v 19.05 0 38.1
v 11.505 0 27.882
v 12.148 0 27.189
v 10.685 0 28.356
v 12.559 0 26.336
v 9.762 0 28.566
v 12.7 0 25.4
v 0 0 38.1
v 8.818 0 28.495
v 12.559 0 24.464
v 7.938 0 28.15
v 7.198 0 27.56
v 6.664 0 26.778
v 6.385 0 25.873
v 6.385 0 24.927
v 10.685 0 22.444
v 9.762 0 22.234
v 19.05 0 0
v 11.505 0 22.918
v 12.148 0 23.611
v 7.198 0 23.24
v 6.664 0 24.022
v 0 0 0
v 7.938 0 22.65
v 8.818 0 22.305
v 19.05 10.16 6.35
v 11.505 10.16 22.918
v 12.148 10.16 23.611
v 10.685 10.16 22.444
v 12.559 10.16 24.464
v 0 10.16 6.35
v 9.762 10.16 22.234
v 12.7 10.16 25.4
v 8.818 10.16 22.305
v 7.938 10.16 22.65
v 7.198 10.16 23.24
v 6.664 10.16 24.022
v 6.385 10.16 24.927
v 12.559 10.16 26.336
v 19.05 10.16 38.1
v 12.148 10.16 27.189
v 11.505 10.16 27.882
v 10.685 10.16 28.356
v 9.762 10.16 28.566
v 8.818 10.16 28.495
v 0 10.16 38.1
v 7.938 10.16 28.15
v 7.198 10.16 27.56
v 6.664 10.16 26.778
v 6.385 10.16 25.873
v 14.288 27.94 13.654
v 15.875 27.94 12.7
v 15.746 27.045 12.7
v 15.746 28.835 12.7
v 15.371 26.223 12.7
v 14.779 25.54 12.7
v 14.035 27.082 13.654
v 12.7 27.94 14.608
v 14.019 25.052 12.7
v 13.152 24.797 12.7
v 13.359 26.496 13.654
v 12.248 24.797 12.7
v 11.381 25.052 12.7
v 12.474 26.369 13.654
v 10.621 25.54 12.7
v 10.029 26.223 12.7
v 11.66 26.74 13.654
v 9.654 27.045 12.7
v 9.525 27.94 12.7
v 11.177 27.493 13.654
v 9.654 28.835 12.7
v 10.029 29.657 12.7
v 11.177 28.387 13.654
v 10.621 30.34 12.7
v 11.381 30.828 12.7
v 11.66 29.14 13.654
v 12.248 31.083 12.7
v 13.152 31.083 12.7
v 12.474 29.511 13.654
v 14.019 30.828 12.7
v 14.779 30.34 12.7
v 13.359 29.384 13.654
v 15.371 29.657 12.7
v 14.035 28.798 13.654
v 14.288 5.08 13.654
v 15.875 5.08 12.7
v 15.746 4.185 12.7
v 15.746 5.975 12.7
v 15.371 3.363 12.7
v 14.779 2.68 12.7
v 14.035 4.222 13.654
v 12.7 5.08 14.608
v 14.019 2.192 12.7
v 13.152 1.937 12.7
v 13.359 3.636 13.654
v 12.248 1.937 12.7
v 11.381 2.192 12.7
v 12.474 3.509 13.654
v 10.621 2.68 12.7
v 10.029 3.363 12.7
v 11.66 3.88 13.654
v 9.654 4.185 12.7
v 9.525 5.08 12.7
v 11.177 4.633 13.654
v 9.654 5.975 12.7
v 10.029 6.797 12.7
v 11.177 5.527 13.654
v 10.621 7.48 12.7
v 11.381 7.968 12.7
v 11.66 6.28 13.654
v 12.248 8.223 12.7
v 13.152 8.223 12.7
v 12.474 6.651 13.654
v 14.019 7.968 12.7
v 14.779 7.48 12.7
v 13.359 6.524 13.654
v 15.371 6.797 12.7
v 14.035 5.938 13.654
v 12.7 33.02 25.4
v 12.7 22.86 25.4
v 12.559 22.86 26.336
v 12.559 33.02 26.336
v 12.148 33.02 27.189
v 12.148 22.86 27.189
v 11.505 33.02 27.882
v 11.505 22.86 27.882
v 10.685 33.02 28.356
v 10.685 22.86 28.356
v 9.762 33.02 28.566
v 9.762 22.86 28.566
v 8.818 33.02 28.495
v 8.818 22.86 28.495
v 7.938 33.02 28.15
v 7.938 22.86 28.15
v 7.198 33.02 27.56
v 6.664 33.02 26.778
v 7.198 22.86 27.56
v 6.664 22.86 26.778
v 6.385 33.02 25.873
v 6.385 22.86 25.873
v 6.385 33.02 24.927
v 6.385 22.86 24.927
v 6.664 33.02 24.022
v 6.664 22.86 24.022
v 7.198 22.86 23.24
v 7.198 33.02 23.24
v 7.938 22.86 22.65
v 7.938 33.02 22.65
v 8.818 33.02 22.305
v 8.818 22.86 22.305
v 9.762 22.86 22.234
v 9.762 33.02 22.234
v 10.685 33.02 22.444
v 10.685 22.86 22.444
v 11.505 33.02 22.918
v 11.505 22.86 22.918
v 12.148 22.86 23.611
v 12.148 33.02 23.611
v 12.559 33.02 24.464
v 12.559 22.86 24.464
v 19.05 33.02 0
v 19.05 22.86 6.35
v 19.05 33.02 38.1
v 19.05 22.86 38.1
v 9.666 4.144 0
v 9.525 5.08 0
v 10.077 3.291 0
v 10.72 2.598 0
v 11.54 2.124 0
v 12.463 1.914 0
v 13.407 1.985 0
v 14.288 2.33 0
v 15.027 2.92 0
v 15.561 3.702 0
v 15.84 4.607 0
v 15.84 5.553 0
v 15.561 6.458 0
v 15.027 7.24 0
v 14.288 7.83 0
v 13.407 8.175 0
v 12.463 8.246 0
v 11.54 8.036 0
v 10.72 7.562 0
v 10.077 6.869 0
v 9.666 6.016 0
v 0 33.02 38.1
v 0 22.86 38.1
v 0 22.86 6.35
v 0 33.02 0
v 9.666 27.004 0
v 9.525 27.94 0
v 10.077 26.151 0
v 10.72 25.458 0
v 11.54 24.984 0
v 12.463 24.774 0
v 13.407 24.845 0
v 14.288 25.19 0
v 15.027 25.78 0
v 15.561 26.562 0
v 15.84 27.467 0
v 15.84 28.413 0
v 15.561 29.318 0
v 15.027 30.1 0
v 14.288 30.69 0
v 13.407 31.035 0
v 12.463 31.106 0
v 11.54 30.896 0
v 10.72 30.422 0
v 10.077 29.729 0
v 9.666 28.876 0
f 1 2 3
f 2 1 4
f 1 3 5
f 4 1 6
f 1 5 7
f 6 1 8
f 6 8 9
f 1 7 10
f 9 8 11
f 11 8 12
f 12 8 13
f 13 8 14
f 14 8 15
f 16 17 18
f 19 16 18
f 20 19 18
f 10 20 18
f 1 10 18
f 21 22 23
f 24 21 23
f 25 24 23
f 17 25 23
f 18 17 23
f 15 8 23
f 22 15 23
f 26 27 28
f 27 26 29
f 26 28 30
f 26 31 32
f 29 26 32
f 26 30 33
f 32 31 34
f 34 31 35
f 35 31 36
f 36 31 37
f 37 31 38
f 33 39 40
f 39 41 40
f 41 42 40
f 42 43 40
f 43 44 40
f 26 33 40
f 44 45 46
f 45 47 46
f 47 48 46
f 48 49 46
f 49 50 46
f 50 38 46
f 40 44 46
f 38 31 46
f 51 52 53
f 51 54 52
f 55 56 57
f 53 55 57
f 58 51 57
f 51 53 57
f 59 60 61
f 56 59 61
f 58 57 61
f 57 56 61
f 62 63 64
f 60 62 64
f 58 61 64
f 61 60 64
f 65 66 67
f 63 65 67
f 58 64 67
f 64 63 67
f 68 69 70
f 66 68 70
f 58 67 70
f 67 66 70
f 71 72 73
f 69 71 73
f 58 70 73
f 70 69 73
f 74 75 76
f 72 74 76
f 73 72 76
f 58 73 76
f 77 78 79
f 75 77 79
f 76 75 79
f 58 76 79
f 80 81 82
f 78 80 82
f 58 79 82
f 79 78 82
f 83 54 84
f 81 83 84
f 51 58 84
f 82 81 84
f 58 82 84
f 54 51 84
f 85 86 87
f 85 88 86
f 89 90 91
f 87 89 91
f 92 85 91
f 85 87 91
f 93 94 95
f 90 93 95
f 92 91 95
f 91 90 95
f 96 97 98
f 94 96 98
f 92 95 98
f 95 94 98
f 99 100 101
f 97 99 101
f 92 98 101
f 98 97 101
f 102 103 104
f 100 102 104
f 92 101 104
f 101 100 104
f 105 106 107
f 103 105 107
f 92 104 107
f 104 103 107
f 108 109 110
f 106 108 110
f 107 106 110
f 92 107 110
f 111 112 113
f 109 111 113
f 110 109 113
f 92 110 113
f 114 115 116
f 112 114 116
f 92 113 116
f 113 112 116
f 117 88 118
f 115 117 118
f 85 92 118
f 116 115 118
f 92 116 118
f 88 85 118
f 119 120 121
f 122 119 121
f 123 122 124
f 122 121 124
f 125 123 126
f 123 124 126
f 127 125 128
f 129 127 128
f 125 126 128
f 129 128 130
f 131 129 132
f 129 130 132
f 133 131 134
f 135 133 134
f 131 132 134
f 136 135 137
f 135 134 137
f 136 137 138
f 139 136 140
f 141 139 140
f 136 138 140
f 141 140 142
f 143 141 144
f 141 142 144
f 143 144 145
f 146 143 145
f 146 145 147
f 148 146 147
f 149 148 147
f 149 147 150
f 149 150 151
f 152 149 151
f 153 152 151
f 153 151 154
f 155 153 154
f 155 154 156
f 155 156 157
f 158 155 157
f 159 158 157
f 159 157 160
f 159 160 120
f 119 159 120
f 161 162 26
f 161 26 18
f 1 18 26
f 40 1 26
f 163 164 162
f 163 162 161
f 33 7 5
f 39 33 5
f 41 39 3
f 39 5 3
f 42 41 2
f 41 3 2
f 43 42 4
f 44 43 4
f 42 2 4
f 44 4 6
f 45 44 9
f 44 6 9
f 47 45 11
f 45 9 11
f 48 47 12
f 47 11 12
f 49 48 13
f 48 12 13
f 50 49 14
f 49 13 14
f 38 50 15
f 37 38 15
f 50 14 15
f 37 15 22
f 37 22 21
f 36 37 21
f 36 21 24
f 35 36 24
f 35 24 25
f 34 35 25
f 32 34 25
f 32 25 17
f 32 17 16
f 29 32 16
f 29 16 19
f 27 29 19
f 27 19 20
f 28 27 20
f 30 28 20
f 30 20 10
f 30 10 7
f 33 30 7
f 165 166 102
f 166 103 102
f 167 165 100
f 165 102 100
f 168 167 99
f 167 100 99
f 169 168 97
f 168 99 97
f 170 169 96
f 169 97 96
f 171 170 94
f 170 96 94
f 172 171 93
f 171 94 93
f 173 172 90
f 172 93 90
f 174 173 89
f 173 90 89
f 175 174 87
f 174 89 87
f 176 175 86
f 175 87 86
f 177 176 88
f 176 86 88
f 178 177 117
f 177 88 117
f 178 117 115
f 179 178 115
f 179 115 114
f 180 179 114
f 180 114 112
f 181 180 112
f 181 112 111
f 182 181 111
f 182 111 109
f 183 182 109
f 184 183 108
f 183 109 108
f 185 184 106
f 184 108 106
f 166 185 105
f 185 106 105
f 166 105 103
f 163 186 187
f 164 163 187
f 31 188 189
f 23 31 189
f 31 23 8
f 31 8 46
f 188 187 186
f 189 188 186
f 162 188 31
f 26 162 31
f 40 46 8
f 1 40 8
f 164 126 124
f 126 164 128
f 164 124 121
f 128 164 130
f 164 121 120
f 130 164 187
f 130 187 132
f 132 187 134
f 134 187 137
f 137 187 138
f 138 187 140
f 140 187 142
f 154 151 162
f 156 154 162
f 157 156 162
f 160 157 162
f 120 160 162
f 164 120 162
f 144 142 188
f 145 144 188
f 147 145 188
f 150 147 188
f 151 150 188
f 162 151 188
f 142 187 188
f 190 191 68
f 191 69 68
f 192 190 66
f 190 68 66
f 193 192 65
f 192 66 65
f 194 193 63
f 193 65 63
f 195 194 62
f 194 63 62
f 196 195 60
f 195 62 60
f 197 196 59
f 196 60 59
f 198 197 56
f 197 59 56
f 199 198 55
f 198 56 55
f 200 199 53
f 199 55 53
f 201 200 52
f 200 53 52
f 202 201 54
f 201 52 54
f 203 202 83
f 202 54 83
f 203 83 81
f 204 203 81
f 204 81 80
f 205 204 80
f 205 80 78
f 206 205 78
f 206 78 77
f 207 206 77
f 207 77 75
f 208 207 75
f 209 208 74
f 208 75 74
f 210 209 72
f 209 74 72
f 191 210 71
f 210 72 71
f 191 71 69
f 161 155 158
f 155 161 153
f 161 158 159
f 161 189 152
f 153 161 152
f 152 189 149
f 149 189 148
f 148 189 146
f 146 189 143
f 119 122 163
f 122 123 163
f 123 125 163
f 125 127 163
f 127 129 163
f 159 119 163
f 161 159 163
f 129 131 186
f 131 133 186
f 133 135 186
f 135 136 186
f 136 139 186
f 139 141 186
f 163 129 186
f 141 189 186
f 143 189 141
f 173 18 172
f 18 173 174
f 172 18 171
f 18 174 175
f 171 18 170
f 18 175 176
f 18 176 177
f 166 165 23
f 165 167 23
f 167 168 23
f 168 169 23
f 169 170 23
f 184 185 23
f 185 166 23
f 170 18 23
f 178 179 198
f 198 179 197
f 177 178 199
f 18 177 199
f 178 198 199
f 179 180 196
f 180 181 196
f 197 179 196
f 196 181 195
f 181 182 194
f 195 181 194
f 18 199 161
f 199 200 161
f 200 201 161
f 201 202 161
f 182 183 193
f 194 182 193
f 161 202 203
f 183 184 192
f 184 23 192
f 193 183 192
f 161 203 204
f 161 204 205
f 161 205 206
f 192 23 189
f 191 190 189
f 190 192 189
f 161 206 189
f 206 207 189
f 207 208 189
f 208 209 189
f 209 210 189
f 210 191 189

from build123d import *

# Parameters (mm, degrees)
F1_DEPTH = 19.05
F3_D     = 6.35
F5_D     = 6.35
F5_DEPTH = 12.7
F5_TIP   = 1.9077324654


with BuildPart() as f1:
    # F0 (on Right) → F1 (new body)
    with BuildSketch(Plane.YZ):
        Polygon((0, 38.1), (0, 0), (33.02, 0), (33.02, 38.1), (22.86, 38.1), (22.86, 6.35), (10.16, 6.35), (10.16, 38.1), align=None)
    extrude(amount=F1_DEPTH)

    # F3 (through all)
    with Locations(Plane(origin=(0, 33.02, 0), x_dir=(-1, 0, 0), z_dir=(0, 1, 0))):
        with Locations((-9.5250001177, 25.4)):
            Hole(F3_D / 2)

    # F5
    with Locations(Plane(origin=(0, 0, 0), x_dir=(1, 0, 0), z_dir=(0, 0, -1))):
        with Locations((12.7, -5.08), (12.7, -27.94)):
            Hole(F5_D / 2, depth=F5_DEPTH)
            with Locations((0, 0, -(F5_DEPTH + F5_TIP / 2))):  # 118° drill point
                Cone(0, F5_D / 2, F5_TIP, mode=Mode.SUBTRACT)


solid = f1.part
